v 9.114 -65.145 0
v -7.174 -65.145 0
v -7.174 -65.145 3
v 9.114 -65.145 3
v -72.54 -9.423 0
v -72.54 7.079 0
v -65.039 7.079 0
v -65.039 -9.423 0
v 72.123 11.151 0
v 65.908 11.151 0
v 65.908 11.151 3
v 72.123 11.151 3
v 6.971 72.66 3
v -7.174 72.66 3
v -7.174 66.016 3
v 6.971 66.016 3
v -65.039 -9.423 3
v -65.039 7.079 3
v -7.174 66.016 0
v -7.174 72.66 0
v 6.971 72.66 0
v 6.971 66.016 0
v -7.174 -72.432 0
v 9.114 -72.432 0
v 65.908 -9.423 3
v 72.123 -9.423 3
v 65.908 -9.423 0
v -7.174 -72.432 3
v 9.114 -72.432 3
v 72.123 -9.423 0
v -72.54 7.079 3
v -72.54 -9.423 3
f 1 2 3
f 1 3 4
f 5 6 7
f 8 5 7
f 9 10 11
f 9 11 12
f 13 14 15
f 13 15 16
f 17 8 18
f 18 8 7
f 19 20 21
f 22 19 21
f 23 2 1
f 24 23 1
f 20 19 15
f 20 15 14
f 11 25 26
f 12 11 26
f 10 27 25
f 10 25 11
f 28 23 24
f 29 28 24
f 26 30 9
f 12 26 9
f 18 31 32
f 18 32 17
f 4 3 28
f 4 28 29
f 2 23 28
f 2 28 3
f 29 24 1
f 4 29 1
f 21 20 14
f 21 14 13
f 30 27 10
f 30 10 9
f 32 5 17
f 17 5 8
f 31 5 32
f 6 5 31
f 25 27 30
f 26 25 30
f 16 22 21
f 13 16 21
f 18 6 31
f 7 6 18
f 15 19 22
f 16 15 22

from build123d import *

# Parameters (mm, degrees)
ESQUISSE2_W          = 14.14483726
ESQUISSE2_H          = 6.643787198
BOSS_EXTRU_1_DEPTH   = 3
ESQUISSE2_W_2        = 7.501050062
ESQUISSE2_H_2        = 16.502310136
BOSS_EXTRU_1_2_DEPTH = 3
ESQUISSE2_W_3        = 6.215155766
ESQUISSE2_H_3        = 20.574308742
BOSS_EXTRU_1_3_DEPTH = 3
ESQUISSE2_W_4        = 16.28799442
ESQUISSE2_H_4        = 7.286734346
BOSS_EXTRU_1_4_DEPTH = 3


with BuildPart() as part:
    # Esquisse2 → Boss.-Extru.1 (new body)
    with BuildSketch(Plane.XY):
        with Locations((-0.101092489, 69.338134115)):
            Rectangle(ESQUISSE2_W, ESQUISSE2_H)
    extrude(amount=BOSS_EXTRU_1_DEPTH)


with BuildPart() as body_2:
    # Esquisse2 → Boss.-Extru.1 2 (new body)
    with BuildSketch(Plane.XY):
        with Locations((-68.789279487, -1.171736469)):
            Rectangle(ESQUISSE2_W_2, ESQUISSE2_H_2)
    extrude(amount=BOSS_EXTRU_1_2_DEPTH)


with BuildPart() as body_3:
    # Esquisse2 → Boss.-Extru.1 3 (new body)
    with BuildSketch(Plane.XY):
        with Locations((69.01572594, 0.864262834)):
            Rectangle(ESQUISSE2_W_3, ESQUISSE2_H_3)
    extrude(amount=BOSS_EXTRU_1_3_DEPTH)


with BuildPart() as body_4:
    # Esquisse2 → Boss.-Extru.1 4 (new body)
    with BuildSketch(Plane.XY):
        with Locations((0.970486091, -68.788344886)):
            Rectangle(ESQUISSE2_W_4, ESQUISSE2_H_4)
    extrude(amount=BOSS_EXTRU_1_4_DEPTH)


solid = Compound([part.part, body_2.part, body_3.part, body_4.part])
